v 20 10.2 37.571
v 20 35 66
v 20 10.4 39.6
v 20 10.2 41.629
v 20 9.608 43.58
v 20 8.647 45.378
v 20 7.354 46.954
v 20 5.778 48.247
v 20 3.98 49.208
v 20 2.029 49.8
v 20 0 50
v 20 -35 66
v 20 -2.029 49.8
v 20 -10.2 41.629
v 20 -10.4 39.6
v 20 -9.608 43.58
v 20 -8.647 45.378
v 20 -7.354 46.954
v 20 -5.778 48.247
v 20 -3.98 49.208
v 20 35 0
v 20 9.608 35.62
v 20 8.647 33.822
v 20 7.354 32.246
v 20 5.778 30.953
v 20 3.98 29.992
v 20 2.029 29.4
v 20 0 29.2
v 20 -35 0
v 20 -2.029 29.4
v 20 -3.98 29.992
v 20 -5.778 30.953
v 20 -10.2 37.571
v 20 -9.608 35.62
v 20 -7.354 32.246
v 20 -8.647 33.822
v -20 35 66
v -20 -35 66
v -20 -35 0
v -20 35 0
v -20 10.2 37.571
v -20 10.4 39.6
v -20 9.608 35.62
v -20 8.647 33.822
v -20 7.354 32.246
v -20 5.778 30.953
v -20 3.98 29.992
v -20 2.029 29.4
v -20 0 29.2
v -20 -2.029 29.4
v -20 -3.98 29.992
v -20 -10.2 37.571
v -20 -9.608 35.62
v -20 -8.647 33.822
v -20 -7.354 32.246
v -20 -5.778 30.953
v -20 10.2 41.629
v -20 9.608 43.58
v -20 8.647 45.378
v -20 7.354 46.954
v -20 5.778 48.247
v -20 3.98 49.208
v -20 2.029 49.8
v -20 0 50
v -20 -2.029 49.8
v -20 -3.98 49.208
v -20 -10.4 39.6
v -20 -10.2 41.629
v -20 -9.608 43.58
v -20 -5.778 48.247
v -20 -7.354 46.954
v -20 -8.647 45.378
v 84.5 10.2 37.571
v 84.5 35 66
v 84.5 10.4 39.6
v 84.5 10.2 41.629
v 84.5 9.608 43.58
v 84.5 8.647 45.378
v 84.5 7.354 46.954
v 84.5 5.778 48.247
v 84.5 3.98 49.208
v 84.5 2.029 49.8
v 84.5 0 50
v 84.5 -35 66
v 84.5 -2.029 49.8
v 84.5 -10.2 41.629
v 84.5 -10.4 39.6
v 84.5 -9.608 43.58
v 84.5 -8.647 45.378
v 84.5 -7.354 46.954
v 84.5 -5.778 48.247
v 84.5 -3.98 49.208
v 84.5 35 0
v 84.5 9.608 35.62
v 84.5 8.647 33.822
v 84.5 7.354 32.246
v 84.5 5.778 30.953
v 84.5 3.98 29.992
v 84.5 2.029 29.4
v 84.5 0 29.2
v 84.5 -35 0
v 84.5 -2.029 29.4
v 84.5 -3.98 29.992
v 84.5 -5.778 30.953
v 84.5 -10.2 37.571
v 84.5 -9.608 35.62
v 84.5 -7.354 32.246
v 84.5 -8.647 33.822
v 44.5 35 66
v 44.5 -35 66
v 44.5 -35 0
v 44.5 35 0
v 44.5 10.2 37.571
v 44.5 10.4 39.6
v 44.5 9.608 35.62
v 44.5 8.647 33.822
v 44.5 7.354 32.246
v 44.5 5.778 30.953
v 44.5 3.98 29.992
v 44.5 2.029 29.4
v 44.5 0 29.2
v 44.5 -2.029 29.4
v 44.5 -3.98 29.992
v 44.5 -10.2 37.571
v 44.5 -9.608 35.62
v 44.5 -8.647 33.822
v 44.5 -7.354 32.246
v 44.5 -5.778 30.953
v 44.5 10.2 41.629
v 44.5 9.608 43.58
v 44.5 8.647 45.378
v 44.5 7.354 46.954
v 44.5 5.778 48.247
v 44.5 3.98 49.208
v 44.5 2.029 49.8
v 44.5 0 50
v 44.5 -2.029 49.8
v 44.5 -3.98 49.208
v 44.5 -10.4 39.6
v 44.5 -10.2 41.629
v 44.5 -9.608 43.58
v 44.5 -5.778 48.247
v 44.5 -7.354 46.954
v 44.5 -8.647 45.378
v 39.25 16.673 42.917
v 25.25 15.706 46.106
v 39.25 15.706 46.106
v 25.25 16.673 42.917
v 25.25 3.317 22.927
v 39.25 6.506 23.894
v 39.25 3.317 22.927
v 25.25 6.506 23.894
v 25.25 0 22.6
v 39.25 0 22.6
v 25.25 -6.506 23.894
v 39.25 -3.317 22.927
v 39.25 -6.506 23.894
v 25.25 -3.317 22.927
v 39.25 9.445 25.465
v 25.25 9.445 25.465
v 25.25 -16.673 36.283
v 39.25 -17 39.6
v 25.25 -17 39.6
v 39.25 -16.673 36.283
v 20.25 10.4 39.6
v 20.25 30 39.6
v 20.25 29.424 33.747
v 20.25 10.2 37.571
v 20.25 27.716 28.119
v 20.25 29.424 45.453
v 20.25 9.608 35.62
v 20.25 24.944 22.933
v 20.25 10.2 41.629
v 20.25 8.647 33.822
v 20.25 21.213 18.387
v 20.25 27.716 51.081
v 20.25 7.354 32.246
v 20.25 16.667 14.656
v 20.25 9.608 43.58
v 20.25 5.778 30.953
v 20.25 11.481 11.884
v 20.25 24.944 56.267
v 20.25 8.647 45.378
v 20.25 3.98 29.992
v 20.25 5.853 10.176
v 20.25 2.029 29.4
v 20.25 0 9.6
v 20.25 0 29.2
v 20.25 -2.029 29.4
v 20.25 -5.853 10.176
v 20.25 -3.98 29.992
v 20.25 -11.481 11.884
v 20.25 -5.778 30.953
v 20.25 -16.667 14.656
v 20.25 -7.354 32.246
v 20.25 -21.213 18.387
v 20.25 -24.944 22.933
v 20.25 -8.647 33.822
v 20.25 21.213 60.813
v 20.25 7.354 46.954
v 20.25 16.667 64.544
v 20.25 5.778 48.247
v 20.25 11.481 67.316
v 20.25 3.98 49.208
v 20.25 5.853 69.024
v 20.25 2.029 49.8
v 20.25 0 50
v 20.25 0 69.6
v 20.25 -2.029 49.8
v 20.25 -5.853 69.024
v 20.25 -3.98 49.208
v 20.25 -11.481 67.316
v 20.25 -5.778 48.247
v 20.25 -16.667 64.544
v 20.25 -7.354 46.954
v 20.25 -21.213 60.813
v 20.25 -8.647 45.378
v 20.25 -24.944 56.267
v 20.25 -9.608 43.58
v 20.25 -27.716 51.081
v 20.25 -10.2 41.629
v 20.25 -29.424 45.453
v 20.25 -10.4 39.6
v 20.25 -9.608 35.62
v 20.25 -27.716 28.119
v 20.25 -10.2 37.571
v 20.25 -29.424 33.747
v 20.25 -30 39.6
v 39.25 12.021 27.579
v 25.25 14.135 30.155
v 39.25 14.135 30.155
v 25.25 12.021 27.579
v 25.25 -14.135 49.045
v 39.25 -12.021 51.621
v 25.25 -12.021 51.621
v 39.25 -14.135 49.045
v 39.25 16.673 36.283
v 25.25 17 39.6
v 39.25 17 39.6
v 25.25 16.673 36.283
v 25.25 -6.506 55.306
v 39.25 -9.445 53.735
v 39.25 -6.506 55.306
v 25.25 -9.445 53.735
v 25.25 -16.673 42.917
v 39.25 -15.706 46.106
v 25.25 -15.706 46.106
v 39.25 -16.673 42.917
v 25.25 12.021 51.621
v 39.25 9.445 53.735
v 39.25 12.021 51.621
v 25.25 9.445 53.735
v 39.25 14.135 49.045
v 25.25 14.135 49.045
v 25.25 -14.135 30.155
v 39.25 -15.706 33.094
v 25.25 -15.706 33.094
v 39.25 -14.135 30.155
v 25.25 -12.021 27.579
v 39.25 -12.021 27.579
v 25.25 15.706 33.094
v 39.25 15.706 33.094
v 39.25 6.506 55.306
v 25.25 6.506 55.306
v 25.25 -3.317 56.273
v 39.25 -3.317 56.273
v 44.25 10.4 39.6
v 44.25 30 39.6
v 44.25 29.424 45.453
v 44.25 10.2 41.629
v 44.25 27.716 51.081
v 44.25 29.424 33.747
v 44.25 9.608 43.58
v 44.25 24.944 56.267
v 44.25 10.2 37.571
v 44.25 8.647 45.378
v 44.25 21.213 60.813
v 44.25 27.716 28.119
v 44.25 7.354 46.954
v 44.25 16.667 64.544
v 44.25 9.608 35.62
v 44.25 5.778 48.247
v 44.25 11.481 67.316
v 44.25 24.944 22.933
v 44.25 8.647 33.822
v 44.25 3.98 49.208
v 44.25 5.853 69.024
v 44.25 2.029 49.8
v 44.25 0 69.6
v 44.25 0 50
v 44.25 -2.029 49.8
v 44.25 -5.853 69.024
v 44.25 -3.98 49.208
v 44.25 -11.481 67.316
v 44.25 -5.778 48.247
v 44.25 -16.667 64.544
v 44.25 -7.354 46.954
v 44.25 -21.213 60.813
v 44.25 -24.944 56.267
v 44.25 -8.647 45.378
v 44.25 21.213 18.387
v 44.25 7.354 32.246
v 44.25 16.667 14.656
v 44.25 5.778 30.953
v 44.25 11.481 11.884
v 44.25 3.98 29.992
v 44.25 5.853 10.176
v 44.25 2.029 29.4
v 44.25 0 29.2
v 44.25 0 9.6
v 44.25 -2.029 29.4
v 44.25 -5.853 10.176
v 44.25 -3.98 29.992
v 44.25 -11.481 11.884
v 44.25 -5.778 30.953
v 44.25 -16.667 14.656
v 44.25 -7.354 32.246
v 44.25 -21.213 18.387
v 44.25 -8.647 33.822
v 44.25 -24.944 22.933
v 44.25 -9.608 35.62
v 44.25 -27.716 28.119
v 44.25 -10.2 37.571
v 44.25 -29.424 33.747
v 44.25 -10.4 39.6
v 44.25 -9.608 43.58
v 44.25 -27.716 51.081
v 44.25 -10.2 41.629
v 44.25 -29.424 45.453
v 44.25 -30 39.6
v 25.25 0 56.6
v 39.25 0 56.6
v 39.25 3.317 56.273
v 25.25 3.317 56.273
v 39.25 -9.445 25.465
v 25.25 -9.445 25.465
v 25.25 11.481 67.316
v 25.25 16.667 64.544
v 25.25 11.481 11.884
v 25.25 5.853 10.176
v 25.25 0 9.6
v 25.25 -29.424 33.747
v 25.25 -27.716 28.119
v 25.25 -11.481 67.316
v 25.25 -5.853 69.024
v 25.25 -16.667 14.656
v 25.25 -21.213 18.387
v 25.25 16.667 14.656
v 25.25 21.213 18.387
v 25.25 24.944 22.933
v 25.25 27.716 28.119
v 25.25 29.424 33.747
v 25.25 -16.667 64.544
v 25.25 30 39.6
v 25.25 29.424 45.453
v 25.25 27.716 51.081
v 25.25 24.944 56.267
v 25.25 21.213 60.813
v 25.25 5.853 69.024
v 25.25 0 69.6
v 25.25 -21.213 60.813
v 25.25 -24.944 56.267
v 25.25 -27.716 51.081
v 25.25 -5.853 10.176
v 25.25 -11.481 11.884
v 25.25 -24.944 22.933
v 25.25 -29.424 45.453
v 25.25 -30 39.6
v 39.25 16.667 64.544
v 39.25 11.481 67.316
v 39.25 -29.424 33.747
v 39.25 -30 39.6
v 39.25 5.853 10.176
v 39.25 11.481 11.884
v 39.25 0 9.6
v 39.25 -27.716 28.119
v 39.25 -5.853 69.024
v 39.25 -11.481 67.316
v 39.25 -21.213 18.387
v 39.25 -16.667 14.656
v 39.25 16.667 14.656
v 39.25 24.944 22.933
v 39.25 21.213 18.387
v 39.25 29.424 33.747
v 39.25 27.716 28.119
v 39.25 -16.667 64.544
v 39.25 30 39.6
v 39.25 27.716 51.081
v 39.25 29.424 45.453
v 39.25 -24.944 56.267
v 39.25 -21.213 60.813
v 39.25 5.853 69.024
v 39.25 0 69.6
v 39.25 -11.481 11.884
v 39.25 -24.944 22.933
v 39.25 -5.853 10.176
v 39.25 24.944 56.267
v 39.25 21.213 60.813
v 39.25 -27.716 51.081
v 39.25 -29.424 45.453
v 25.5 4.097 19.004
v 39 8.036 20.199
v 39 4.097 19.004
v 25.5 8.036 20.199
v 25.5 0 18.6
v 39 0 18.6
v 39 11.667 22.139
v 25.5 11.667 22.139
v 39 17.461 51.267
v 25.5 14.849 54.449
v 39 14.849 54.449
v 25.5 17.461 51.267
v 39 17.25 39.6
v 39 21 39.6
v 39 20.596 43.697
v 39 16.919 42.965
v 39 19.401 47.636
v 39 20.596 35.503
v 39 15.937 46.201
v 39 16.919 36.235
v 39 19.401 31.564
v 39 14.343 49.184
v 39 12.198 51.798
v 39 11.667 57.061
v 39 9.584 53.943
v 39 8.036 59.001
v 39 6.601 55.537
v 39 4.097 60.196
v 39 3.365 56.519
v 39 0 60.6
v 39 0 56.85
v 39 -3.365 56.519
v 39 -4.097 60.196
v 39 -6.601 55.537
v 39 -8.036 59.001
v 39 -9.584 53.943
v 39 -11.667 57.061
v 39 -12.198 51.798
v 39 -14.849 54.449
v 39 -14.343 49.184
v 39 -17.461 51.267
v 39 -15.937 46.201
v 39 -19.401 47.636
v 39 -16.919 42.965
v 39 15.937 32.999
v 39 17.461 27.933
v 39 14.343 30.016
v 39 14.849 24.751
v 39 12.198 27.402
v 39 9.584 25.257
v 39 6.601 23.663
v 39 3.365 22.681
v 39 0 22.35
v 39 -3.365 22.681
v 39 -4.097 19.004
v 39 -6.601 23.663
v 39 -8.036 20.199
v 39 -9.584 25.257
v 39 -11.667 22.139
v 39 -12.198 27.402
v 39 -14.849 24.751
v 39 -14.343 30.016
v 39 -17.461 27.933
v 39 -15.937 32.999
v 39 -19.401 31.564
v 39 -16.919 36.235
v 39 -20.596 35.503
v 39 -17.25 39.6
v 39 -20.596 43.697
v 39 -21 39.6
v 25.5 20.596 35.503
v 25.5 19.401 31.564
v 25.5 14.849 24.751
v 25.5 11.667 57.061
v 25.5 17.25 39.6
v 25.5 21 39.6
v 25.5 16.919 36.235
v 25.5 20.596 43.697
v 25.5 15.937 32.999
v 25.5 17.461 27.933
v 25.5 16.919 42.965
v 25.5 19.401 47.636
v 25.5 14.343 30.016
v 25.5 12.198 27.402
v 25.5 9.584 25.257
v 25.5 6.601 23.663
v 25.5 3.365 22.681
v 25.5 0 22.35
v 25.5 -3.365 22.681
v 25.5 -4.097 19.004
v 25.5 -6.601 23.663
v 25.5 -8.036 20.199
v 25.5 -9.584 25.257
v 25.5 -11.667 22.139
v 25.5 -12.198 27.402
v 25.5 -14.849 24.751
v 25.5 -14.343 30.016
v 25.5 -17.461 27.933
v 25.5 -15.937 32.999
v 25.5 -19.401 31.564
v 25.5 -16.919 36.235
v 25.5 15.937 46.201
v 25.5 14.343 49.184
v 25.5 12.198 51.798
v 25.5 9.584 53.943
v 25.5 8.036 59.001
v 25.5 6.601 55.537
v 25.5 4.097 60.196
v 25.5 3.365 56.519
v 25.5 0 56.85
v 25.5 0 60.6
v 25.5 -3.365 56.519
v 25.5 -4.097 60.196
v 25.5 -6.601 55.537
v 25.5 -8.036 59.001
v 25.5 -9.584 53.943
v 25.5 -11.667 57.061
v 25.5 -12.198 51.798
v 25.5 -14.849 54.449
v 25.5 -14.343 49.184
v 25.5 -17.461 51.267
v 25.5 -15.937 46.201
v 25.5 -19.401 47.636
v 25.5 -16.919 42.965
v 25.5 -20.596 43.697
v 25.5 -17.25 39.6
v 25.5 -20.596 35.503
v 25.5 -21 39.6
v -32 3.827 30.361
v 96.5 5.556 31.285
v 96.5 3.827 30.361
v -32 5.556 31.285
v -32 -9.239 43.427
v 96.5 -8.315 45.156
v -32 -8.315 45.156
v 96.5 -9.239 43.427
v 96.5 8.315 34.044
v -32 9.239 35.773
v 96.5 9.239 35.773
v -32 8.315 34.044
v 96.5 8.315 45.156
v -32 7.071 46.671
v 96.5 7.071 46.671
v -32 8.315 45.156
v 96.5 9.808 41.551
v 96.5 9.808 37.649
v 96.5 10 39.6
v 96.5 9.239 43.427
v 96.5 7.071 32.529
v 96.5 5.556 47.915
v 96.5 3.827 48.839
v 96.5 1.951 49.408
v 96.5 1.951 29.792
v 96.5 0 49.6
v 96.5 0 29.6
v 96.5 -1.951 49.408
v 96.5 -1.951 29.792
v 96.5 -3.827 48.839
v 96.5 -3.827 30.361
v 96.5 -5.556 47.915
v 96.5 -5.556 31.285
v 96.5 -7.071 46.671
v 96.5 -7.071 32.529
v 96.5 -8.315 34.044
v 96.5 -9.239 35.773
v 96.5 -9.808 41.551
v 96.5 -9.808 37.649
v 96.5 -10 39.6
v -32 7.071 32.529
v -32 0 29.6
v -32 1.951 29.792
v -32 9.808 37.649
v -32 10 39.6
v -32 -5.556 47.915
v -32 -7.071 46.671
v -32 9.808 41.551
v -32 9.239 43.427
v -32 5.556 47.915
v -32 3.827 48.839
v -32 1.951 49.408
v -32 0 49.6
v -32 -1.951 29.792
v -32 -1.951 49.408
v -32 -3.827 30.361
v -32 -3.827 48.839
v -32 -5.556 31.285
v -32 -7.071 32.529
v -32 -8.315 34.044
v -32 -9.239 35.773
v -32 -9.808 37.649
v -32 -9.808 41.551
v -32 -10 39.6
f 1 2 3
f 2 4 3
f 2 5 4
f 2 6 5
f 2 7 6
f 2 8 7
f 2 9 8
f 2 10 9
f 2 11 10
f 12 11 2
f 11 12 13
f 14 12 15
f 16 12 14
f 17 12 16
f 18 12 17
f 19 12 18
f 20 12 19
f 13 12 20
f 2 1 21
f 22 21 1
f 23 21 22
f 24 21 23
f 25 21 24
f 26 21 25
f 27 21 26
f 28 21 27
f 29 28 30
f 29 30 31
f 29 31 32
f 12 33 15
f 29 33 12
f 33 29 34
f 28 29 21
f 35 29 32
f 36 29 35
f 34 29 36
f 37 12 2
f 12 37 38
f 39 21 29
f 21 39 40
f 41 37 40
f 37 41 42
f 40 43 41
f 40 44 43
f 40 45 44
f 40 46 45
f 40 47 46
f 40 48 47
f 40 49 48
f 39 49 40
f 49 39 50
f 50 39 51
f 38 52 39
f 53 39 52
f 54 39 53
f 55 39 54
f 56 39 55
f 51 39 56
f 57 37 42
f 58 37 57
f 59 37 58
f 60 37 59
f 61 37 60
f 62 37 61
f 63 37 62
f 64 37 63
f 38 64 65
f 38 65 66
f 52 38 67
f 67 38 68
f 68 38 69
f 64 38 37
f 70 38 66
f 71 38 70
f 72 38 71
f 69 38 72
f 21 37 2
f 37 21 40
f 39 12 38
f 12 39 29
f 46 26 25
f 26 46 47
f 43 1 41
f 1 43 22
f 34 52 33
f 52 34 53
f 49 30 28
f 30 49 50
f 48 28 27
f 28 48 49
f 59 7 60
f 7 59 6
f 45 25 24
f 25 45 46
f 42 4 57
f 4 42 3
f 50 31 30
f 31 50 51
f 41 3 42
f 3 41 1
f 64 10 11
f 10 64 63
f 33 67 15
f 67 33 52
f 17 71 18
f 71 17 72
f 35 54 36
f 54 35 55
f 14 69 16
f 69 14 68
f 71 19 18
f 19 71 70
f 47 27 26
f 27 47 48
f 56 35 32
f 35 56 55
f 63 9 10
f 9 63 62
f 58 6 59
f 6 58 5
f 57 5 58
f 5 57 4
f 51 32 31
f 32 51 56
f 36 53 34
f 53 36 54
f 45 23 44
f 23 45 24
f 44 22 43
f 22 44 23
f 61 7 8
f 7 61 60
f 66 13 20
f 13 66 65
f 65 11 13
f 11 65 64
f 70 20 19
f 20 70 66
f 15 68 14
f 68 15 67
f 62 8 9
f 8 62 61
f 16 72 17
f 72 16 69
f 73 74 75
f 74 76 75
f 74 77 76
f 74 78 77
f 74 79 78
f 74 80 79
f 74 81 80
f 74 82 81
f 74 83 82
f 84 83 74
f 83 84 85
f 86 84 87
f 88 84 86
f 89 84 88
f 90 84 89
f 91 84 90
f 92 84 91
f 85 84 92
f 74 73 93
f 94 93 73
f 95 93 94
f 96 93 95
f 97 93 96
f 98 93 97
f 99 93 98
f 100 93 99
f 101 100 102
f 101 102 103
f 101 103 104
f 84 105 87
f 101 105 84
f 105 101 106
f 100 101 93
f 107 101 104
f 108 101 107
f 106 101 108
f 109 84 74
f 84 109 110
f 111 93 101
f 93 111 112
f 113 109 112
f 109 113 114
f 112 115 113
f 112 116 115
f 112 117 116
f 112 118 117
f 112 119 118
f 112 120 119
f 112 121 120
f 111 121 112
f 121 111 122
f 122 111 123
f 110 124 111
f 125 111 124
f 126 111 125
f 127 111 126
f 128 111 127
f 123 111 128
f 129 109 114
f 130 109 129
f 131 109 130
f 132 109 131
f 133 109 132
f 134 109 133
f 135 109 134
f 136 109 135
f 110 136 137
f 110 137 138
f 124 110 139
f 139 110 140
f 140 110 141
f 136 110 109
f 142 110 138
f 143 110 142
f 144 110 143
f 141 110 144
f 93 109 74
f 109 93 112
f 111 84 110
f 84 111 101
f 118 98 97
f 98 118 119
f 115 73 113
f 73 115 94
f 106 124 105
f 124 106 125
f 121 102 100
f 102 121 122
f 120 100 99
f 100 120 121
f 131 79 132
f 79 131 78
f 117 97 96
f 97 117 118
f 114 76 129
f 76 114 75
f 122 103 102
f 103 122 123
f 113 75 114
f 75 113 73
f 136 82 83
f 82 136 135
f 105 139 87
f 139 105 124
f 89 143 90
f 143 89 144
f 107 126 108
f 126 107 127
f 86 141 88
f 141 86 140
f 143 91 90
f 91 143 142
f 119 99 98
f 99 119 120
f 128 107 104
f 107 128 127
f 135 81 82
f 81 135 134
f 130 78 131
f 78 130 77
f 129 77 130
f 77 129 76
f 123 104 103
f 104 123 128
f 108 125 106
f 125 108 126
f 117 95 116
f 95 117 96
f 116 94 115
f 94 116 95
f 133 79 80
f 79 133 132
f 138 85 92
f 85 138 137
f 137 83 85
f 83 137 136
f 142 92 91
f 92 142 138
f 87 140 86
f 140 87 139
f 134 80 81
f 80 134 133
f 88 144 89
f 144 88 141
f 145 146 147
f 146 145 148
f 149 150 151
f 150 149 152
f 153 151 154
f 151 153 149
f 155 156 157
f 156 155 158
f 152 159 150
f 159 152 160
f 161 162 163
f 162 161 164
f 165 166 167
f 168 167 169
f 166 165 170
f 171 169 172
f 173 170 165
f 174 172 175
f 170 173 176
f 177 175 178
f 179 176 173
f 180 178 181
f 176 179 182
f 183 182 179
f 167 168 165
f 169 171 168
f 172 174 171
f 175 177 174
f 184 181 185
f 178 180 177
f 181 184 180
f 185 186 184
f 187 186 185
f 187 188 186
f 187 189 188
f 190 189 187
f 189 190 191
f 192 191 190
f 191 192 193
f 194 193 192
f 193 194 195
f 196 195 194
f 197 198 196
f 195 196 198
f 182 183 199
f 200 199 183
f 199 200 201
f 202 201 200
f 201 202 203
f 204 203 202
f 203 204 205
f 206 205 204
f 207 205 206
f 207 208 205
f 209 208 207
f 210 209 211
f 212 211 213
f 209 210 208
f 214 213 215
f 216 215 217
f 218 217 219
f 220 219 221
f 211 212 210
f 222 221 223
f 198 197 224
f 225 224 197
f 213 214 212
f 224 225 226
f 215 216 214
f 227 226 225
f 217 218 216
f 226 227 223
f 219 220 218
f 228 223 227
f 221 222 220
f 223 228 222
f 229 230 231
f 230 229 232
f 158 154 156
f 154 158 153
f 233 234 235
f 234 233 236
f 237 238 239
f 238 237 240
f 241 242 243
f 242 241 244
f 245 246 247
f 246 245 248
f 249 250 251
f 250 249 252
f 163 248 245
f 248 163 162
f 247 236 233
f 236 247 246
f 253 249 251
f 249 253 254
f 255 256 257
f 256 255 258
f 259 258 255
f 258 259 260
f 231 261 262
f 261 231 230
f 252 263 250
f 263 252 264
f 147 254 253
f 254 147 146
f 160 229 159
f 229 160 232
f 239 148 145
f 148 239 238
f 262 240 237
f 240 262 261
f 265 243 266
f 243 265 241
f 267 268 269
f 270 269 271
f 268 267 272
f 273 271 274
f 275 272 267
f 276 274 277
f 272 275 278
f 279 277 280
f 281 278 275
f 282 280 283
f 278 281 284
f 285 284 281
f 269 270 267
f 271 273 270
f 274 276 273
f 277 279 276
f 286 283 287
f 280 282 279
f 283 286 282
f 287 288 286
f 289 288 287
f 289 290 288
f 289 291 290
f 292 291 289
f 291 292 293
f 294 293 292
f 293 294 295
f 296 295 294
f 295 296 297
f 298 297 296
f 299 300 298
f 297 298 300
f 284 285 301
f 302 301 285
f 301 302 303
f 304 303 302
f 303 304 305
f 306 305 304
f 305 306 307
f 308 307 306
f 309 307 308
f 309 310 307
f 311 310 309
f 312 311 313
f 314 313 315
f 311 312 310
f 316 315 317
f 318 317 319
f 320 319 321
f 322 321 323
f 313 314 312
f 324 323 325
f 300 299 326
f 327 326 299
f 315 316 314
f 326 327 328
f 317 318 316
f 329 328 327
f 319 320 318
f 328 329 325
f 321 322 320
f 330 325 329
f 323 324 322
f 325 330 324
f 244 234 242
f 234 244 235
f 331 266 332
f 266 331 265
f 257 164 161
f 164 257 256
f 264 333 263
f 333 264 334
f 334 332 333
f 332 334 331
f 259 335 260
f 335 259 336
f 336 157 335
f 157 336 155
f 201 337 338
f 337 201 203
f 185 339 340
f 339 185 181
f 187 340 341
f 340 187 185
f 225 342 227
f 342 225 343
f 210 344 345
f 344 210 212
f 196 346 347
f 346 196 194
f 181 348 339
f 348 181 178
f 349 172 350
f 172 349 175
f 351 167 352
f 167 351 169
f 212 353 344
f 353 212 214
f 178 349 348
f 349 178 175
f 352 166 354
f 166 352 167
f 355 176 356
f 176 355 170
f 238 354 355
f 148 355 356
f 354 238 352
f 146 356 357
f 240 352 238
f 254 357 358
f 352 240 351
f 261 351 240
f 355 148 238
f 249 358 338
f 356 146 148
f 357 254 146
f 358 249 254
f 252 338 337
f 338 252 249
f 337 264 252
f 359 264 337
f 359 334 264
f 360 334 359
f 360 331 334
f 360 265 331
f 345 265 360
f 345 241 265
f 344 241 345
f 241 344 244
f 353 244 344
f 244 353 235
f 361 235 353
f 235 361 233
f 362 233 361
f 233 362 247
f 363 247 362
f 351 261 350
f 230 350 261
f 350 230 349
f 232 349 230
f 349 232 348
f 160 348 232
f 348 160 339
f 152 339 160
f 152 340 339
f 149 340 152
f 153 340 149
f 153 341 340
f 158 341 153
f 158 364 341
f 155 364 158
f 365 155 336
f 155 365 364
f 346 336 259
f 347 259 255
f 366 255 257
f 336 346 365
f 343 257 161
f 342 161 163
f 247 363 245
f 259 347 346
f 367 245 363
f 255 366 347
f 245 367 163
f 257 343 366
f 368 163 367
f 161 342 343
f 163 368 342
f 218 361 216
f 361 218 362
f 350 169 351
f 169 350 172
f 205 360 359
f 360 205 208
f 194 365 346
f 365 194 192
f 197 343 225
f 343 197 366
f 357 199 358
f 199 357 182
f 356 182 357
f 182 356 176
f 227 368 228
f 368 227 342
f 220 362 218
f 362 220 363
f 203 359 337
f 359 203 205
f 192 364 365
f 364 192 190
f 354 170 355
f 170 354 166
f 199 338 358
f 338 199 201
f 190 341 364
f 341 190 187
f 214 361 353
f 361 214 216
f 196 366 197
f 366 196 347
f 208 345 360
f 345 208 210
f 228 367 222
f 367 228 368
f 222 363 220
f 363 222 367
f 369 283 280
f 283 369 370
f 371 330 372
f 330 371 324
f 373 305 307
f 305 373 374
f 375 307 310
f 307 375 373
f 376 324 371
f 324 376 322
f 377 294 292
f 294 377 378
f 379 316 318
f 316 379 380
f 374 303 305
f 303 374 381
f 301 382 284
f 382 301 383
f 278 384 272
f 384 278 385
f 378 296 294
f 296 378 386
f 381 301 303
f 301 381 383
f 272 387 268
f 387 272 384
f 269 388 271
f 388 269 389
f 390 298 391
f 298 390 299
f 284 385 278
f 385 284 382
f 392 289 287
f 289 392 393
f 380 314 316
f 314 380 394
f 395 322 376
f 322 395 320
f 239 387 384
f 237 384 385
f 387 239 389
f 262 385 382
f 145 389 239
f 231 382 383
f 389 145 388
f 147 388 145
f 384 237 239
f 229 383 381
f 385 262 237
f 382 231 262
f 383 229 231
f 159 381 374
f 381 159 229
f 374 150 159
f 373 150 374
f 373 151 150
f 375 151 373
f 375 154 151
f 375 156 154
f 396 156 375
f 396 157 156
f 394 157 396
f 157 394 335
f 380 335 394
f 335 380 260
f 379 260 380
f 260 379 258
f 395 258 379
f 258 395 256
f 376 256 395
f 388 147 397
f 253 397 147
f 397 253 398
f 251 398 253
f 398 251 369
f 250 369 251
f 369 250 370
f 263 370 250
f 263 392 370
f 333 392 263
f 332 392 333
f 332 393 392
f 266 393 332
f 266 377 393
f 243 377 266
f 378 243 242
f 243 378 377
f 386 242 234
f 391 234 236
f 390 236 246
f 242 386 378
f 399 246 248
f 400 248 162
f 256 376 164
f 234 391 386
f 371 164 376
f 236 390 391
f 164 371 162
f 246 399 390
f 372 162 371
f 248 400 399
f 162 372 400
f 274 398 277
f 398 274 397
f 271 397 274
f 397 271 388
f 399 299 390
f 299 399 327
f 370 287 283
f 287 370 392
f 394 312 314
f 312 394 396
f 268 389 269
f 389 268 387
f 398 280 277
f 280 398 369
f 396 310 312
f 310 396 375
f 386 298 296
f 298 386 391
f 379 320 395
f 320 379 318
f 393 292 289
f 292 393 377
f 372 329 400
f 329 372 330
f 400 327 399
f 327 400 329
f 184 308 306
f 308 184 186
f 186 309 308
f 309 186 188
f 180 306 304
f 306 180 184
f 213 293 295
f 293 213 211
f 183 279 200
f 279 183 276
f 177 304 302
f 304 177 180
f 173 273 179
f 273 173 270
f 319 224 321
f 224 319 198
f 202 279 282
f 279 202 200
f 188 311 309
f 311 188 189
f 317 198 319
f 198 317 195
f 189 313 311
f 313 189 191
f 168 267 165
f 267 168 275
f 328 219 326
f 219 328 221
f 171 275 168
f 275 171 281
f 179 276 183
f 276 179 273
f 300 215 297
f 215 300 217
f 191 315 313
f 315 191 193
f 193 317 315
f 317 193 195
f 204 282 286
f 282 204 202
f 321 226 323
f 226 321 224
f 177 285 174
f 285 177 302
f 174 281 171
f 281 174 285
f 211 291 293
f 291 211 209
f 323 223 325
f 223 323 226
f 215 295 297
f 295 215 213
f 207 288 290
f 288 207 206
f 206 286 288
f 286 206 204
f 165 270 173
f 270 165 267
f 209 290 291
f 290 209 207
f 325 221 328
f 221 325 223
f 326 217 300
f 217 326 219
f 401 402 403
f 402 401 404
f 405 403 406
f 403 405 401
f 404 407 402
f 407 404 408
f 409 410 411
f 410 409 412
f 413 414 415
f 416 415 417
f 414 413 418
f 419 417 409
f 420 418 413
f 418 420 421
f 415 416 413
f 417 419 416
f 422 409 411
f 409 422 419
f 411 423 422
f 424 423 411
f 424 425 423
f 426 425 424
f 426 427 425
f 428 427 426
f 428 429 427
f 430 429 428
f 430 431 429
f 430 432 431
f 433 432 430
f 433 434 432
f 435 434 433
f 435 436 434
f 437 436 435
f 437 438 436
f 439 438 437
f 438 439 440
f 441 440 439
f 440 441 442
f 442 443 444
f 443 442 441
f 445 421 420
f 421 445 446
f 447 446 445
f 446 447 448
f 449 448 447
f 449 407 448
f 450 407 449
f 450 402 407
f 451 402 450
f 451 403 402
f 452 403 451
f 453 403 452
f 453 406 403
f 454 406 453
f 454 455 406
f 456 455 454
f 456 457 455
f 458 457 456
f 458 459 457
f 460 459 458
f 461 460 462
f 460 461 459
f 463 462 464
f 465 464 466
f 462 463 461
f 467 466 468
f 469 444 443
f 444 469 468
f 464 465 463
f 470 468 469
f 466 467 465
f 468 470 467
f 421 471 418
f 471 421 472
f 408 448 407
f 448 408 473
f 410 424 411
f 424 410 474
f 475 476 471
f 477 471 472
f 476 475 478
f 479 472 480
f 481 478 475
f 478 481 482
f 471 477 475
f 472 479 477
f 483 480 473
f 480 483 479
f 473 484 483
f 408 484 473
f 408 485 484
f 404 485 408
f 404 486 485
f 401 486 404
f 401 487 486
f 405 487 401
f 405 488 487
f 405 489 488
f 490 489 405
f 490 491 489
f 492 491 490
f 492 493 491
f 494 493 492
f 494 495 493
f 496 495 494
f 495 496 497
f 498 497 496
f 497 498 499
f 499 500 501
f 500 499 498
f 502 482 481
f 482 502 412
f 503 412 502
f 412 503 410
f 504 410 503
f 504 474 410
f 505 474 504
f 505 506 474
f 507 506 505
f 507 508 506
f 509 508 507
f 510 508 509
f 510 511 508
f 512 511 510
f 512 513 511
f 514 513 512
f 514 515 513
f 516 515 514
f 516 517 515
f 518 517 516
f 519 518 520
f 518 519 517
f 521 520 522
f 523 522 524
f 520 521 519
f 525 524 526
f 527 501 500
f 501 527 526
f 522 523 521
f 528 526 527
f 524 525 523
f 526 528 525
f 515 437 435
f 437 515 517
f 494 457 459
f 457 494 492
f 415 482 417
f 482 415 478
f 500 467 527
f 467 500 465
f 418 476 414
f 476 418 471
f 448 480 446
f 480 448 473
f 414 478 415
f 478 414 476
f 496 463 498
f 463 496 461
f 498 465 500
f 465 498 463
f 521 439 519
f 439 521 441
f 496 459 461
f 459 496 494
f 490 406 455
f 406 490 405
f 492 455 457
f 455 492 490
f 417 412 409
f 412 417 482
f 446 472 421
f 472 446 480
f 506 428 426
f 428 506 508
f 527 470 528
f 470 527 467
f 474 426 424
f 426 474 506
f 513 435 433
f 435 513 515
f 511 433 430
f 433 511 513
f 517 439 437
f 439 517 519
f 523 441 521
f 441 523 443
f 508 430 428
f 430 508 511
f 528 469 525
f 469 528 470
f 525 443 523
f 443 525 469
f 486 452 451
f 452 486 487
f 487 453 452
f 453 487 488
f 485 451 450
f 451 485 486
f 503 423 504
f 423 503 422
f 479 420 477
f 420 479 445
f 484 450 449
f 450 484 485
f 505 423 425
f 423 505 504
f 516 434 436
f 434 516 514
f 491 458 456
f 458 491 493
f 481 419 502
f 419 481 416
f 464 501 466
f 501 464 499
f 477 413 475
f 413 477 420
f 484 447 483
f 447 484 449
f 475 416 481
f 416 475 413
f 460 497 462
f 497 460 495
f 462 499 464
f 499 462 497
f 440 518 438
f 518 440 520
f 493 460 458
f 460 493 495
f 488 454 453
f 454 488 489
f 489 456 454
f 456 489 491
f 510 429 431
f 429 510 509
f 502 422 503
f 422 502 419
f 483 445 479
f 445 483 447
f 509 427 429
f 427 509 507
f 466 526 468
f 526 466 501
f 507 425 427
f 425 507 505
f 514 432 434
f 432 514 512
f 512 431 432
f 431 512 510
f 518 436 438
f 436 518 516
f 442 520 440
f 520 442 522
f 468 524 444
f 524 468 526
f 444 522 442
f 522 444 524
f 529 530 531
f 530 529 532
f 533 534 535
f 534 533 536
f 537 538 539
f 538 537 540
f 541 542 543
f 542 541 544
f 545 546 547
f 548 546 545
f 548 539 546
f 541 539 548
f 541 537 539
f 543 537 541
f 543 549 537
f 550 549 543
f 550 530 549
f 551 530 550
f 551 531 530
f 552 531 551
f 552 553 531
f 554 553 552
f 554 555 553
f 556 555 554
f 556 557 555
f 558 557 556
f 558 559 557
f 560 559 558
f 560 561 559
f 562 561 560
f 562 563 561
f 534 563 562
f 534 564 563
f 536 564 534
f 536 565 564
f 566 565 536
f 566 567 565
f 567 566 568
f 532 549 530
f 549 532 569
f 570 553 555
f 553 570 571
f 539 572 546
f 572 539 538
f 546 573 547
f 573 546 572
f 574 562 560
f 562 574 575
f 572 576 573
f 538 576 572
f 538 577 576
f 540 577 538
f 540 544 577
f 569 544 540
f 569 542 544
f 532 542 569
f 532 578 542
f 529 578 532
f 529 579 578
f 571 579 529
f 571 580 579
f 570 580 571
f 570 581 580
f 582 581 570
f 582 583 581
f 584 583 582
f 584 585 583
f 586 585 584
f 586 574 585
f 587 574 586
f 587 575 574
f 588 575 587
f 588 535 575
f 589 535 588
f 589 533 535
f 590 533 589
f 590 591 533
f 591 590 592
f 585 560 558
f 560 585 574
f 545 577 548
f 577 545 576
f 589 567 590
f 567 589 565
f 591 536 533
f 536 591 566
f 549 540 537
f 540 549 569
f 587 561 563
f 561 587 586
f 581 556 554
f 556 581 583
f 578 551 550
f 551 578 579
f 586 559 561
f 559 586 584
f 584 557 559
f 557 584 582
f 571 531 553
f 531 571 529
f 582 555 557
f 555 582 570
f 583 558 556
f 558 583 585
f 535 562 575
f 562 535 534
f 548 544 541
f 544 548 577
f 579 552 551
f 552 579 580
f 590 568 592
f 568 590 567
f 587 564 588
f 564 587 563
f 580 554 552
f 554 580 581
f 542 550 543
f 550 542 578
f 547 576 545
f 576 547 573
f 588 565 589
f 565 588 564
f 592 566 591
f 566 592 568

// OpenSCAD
$fn = 32;

// ------------------------------------------------------------------------
// Pulley assembly: d60 pulley with a belt, shaft d20
// Every part is its own module, assembly() places them once.
// ------------------------------------------------------------------------

// --- part 1 ---
module support1() {
  difference() {
    translate([-20, -35, 0]) cube([40, 70, 66]);
    translate([0, 0, 39.6]) rotate([0, 90, 0]) cylinder(h = 42, d = 20.8, center = true);
  }
}

// --- part 2 ---
module support2() {
  difference() {
    translate([-20, -35, 0]) cube([40, 70, 66]);
    translate([0, 0, 39.6]) rotate([0, 90, 0]) cylinder(h = 42, d = 20.8, center = true);
  }
}

// --- part 3 ---
module shaft() {
  translate([0, 0, -64.25]) cylinder(h = 128.5, d = 20);
}

// --- part 4 ---
module pulley() {
  difference() {
    union() {
      cylinder(h = 24, d = 34);
      cylinder(h = 5, d = 60);
      translate([0, 0, 19]) cylinder(h = 5, d = 60);
    }
    translate([0, 0, -1]) cylinder(h = 26, d = 20.8);
  }
}

// --- part 5 ---
module belt() {
  difference() {
      translate([0, 0, 0]) cylinder(h = 13.5, d = 42);
      translate([0, 0, -1]) cylinder(h = 15.5, d = 34.5);
    }
}

// --- assembly ---
module assembly() {
  translate([0, 0, 0]) rotate([0, 0, 0]) support1();
  translate([64.5, 0, 0]) rotate([0, 0, 0]) support2();
  translate([32.25, 0, 39.6]) rotate([0, 90, 0]) shaft();
  translate([20.25, 0, 39.6]) rotate([0, 90, 0]) pulley();
  translate([25.5, 0, 39.6]) rotate([0, 90, 0]) belt();
}

assembly();
